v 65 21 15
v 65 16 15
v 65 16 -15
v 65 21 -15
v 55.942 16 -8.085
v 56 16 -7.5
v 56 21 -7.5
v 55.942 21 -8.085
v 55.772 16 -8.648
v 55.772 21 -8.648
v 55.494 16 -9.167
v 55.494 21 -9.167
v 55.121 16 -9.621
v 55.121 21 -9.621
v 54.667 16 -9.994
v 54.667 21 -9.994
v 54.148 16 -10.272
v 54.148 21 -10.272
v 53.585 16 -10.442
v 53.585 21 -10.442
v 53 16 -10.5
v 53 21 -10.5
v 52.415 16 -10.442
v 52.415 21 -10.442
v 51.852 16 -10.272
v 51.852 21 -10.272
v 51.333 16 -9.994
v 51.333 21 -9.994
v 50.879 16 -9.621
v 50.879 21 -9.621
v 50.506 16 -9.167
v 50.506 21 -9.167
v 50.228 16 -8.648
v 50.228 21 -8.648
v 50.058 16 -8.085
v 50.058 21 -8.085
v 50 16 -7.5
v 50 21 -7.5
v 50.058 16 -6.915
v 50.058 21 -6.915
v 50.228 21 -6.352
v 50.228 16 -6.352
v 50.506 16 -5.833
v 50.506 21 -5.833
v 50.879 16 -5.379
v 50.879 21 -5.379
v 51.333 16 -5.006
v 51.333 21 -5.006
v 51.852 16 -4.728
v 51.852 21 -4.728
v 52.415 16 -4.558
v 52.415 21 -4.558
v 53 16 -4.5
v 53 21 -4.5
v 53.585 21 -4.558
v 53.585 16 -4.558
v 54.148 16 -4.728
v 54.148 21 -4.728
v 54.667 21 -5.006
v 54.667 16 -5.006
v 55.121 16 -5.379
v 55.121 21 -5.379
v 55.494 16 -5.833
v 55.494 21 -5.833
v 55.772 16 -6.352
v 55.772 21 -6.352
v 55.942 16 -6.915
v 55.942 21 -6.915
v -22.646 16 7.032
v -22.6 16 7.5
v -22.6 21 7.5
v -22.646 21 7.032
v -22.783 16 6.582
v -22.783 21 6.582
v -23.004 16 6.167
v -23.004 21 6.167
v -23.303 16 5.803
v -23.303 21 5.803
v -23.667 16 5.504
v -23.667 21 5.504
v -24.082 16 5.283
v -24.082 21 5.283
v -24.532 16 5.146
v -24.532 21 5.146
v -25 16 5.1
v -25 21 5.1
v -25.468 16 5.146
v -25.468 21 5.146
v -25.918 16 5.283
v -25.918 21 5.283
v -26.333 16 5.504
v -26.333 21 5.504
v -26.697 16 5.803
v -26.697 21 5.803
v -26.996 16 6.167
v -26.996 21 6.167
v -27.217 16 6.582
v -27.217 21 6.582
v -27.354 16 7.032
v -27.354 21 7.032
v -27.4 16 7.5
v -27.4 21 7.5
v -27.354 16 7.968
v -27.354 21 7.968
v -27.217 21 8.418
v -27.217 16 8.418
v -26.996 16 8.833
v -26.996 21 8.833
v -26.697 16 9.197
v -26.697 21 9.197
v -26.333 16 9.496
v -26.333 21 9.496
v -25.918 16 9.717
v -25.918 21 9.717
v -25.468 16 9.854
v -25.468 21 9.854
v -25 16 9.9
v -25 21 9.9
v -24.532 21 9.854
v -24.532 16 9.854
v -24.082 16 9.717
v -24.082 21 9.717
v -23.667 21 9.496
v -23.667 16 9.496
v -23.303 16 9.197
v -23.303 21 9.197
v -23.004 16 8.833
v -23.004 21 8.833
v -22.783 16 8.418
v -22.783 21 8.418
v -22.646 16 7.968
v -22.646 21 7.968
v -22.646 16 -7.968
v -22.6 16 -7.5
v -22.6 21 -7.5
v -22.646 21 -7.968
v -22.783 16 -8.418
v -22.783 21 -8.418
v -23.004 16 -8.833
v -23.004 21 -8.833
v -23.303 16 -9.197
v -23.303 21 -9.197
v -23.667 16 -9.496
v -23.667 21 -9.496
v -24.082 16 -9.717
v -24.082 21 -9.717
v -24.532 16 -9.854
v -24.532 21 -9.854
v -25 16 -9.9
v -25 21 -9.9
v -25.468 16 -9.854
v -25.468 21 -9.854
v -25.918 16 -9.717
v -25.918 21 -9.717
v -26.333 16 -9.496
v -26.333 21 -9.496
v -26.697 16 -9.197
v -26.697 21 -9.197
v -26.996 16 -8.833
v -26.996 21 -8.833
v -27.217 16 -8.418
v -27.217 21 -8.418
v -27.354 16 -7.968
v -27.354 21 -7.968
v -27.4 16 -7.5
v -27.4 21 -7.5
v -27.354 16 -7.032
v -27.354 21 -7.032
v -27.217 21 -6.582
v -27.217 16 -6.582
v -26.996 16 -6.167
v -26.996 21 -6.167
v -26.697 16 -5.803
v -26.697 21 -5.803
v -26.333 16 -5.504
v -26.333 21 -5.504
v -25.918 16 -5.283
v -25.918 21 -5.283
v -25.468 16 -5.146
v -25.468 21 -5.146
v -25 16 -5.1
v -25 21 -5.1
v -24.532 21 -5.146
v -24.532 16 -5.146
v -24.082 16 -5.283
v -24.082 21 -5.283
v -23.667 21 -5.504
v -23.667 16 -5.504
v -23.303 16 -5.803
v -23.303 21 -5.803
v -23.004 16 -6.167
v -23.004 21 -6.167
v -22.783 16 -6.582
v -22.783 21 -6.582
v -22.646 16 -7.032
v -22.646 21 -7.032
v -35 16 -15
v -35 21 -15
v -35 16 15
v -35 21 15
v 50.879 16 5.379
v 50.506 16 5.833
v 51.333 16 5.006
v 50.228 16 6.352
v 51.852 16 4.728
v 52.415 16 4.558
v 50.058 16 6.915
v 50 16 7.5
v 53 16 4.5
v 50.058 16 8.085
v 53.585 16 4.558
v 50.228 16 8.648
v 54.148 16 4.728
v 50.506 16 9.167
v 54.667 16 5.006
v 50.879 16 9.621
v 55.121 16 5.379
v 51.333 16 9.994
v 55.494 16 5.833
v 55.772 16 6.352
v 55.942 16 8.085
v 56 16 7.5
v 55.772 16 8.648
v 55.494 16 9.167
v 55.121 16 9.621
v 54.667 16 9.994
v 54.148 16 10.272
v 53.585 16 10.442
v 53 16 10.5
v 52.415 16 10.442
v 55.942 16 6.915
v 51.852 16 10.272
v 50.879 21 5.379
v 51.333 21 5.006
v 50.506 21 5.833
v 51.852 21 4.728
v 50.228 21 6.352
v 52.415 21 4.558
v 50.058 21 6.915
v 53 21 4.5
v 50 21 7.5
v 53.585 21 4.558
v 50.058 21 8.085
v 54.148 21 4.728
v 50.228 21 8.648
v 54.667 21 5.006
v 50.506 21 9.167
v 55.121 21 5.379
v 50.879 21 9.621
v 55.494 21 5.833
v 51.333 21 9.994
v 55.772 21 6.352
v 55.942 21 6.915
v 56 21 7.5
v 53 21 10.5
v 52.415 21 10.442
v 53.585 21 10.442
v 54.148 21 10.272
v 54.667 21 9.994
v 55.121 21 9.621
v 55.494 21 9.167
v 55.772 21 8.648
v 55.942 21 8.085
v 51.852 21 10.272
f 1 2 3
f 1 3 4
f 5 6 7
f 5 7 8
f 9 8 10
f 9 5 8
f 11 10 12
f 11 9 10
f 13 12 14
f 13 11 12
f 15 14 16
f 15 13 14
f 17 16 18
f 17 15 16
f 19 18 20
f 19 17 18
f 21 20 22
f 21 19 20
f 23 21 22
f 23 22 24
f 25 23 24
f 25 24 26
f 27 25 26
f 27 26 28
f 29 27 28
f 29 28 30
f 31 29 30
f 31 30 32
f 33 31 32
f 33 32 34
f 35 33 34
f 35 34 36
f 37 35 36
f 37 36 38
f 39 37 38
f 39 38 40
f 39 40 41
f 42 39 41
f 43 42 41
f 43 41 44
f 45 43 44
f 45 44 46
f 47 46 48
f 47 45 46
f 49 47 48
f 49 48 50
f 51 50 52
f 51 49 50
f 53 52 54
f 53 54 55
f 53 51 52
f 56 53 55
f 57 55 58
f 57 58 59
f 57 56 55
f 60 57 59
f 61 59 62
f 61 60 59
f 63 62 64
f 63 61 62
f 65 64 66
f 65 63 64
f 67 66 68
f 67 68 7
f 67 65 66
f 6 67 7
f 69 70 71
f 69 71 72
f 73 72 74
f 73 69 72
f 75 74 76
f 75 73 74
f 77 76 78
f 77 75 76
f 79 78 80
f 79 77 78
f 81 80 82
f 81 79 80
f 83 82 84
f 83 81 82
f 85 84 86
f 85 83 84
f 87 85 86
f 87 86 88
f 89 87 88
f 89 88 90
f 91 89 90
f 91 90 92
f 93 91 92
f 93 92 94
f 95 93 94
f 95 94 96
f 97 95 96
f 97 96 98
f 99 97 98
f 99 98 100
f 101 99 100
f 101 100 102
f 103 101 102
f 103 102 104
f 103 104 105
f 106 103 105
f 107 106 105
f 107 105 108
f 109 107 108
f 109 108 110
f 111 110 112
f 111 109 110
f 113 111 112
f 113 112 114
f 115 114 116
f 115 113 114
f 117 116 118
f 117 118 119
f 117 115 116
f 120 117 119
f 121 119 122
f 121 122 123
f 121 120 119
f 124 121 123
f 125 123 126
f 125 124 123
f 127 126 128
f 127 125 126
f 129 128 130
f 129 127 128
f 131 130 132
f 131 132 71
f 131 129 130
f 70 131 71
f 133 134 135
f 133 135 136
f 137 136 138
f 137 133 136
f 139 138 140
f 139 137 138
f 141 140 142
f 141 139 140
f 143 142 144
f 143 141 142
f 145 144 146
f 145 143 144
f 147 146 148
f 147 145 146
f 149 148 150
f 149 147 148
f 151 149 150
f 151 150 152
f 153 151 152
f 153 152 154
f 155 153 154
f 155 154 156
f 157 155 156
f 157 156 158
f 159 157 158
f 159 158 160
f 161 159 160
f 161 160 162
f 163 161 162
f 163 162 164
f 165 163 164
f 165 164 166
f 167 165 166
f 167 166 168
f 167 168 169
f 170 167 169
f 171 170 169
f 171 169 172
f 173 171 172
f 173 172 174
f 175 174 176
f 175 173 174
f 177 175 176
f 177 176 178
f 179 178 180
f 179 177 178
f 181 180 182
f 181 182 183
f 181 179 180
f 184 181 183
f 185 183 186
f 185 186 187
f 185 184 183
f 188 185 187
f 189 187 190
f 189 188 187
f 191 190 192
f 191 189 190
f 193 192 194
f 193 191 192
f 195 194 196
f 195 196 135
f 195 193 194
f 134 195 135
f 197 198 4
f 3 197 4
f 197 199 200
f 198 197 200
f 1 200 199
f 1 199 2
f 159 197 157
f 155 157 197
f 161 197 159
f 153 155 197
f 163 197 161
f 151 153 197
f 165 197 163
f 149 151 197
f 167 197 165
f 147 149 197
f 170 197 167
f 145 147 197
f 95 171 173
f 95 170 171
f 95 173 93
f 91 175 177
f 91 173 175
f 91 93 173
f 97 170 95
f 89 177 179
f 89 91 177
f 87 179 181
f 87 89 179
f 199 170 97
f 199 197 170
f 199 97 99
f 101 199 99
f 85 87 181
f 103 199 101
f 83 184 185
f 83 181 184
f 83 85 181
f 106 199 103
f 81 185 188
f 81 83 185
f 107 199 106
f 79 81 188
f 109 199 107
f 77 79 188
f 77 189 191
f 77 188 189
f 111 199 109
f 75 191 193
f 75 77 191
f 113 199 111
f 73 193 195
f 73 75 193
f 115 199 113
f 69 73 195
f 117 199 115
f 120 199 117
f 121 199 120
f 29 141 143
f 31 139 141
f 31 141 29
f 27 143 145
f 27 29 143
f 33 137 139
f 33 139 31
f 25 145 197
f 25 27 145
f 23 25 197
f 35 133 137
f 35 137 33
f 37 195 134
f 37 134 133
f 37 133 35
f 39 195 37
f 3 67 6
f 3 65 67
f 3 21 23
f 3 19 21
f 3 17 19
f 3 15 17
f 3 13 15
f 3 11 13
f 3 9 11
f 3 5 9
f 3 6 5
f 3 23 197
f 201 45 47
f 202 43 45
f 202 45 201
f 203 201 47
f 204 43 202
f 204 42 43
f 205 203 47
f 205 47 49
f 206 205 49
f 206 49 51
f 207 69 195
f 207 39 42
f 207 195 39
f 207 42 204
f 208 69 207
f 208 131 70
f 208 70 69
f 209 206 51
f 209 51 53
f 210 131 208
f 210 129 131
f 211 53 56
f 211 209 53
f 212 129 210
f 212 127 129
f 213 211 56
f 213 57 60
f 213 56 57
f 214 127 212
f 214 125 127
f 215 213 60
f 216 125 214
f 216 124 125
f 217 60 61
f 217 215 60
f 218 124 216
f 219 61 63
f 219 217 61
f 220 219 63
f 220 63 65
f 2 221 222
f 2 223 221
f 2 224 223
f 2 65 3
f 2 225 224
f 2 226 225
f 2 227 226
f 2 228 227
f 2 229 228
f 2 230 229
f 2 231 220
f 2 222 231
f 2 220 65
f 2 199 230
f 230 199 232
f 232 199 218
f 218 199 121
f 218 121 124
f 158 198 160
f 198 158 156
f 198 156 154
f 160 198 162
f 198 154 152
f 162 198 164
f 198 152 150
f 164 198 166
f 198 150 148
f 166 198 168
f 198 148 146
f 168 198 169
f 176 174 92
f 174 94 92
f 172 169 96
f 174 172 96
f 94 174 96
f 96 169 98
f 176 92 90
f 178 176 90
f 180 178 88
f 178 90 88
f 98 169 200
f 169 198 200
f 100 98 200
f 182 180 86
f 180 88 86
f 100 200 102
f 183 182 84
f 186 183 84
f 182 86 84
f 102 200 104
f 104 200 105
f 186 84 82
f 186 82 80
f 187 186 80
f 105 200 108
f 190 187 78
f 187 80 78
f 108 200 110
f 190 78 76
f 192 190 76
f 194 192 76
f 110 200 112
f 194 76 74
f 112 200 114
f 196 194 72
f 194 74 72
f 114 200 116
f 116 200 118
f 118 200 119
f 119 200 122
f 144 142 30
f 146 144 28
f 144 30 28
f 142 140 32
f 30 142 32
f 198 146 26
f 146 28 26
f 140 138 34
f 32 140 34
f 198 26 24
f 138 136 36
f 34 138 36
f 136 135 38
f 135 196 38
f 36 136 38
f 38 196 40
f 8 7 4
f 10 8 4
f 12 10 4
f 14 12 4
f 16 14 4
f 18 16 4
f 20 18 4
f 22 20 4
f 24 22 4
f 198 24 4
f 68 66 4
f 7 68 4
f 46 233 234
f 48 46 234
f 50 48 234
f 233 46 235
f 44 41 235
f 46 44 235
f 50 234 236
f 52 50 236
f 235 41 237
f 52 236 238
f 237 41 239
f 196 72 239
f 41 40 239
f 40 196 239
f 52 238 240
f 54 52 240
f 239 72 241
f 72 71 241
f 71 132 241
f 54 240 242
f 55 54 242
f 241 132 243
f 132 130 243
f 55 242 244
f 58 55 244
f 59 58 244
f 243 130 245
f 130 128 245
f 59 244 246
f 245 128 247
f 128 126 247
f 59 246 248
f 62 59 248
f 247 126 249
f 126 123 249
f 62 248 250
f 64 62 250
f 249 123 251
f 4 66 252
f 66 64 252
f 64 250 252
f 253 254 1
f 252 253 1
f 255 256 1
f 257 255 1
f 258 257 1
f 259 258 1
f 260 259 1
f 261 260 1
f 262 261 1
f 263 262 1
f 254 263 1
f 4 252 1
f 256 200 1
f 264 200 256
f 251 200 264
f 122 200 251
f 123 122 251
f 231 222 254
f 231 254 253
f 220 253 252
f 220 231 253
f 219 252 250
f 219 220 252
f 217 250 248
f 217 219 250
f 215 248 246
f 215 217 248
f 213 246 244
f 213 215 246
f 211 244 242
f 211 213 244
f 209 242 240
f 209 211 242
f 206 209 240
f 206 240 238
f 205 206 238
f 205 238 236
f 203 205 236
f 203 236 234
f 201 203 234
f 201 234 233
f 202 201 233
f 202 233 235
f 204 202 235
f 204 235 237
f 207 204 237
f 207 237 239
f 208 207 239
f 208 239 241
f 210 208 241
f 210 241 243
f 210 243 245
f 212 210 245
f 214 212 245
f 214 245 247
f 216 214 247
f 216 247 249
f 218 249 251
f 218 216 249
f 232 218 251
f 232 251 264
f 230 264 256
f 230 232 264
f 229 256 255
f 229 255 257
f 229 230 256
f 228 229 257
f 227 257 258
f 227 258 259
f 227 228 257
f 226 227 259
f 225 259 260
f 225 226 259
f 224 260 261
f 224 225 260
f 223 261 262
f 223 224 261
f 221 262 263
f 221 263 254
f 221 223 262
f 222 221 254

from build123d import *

# Parameters (mm, degrees)
SKIZZE3_W                            = 100
SKIZZE3_H                            = 5
AUFSATZ_LINEAR_AUSTRAGEN1_DEPTH      = 15
AUFSATZ_LINEAR_AUSTRAGEN1_DEPTH_BACK = 15
SKIZZE8_R                            = 3
SCHNITT_LINEAR_AUSTRAGEN1_DEPTH      = 21
SKIZZE10_R                           = 2.4
SCHNITT_LINEAR_AUSTRAGEN2_DEPTH      = 21


with BuildPart() as part:
    # Skizze3 → Aufsatz-Linear austragen1 (new body, two sides)
    with BuildSketch(Plane.XY) as aufsatz_linear_austragen1_sk:
        with Locations((15, 18.5)):
            Rectangle(SKIZZE3_W, SKIZZE3_H)
    extrude(amount=AUFSATZ_LINEAR_AUSTRAGEN1_DEPTH)
    extrude(aufsatz_linear_austragen1_sk.sketch, amount=-AUFSATZ_LINEAR_AUSTRAGEN1_DEPTH_BACK)

    # Skizze8 → Schnitt-Linear austragen1 (cut)
    with BuildSketch(Plane(origin=(0, 0, 0), x_dir=(1, 0, 0), z_dir=(0, 1, 0))):
        with Locations((53, 7.5)):
            Circle(SKIZZE8_R)
        with Locations((53, -7.5)):
            Circle(SKIZZE8_R)
    extrude(amount=SCHNITT_LINEAR_AUSTRAGEN1_DEPTH, mode=Mode.SUBTRACT)

    # Skizze10 → Schnitt-Linear austragen2 (cut)
    with BuildSketch(Plane(origin=(0, 0, 0), x_dir=(1, 0, 0), z_dir=(0, 1, 0))):
        with Locations((-25, 7.5)):
            Circle(SKIZZE10_R)
        with Locations((-25, -7.5)):
            Circle(SKIZZE10_R)
    extrude(amount=SCHNITT_LINEAR_AUSTRAGEN2_DEPTH, mode=Mode.SUBTRACT)


solid = part.part
